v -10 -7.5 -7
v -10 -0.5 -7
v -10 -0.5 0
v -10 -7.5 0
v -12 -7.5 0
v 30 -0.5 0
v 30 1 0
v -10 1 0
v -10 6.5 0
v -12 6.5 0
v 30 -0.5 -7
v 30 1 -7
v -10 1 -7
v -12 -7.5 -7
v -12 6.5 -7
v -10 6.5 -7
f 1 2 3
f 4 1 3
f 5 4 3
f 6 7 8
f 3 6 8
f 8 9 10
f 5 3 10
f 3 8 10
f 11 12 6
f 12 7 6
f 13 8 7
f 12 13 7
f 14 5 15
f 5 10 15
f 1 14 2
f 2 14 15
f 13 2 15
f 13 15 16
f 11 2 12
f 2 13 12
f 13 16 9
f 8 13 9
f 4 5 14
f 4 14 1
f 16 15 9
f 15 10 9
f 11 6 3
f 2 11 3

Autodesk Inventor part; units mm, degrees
ref_plane "YZ Plane" through (0, 0, 0) normal (1, 0, 0) x (0, 1, 0)
ref_plane "XZ Plane" through (0, 0, 0) normal (0, 1, 0) x (-1, 0, 0)
ref_plane "Work Plane1" through (0, 0, 0) normal (0, 0, 1) x (1, 0, 0)
sketch "Sketch1" plane through (0, 0, 0) normal (0, 0, 1) x (1, 0, 0)
  line L0 (0, 0) -> (0, -15.5) projected
  line L1 (0, -15.5) -> (30, -15.5) projected
  line L2 (30, -0.5) -> (30, -15.5) projected
  line L3 (0, -0.5) -> (30, -0.5) projected
  line L4 (30, -0.5) -> (-10, -0.5)
  line L5 (-10, -0.5) -> (-10, 1.5)
  line L6 (-10, 1.5) -> (30, 1.5)
  line L7 (30, 1.5) -> (30, -0.5)
  point P0 (0, -0.5)
  dimension "d0" = 40
  dimension "d1" = 2
extrude "Extrusion1" add sketch "Sketch1" against normal up to surface (7 mm away) contours L4 L5 L6 L7 L3
ref_plane "Work Plane2" through (0, -16, -7) normal (0, -1, 0) x (1, 0, 0)
move faces "Move1" translate (0, -0.5, 0) faces at (16.6667, 1.5, -2.3333)
sketch "Sketch3" plane through (-10, -0.5, 0) normal (0, -1, 0) x (1, 0, 0)
  line L0 (40, 0) -> (0, 0) projected
  line L1 (0, 0) -> (-2, 0)
  line L2 (-2, 0) -> (-2, -7)
  line L3 (-2, -7) -> (0, -7)
  line L4 (0, -7) -> (0, 0)
  point P0 (10, 0)
  dimension "d19" = 2
extrude "Extrusion3" add sketch "Sketch3" along normal blind 7 and the other way blind 7
properties part number "fence"
